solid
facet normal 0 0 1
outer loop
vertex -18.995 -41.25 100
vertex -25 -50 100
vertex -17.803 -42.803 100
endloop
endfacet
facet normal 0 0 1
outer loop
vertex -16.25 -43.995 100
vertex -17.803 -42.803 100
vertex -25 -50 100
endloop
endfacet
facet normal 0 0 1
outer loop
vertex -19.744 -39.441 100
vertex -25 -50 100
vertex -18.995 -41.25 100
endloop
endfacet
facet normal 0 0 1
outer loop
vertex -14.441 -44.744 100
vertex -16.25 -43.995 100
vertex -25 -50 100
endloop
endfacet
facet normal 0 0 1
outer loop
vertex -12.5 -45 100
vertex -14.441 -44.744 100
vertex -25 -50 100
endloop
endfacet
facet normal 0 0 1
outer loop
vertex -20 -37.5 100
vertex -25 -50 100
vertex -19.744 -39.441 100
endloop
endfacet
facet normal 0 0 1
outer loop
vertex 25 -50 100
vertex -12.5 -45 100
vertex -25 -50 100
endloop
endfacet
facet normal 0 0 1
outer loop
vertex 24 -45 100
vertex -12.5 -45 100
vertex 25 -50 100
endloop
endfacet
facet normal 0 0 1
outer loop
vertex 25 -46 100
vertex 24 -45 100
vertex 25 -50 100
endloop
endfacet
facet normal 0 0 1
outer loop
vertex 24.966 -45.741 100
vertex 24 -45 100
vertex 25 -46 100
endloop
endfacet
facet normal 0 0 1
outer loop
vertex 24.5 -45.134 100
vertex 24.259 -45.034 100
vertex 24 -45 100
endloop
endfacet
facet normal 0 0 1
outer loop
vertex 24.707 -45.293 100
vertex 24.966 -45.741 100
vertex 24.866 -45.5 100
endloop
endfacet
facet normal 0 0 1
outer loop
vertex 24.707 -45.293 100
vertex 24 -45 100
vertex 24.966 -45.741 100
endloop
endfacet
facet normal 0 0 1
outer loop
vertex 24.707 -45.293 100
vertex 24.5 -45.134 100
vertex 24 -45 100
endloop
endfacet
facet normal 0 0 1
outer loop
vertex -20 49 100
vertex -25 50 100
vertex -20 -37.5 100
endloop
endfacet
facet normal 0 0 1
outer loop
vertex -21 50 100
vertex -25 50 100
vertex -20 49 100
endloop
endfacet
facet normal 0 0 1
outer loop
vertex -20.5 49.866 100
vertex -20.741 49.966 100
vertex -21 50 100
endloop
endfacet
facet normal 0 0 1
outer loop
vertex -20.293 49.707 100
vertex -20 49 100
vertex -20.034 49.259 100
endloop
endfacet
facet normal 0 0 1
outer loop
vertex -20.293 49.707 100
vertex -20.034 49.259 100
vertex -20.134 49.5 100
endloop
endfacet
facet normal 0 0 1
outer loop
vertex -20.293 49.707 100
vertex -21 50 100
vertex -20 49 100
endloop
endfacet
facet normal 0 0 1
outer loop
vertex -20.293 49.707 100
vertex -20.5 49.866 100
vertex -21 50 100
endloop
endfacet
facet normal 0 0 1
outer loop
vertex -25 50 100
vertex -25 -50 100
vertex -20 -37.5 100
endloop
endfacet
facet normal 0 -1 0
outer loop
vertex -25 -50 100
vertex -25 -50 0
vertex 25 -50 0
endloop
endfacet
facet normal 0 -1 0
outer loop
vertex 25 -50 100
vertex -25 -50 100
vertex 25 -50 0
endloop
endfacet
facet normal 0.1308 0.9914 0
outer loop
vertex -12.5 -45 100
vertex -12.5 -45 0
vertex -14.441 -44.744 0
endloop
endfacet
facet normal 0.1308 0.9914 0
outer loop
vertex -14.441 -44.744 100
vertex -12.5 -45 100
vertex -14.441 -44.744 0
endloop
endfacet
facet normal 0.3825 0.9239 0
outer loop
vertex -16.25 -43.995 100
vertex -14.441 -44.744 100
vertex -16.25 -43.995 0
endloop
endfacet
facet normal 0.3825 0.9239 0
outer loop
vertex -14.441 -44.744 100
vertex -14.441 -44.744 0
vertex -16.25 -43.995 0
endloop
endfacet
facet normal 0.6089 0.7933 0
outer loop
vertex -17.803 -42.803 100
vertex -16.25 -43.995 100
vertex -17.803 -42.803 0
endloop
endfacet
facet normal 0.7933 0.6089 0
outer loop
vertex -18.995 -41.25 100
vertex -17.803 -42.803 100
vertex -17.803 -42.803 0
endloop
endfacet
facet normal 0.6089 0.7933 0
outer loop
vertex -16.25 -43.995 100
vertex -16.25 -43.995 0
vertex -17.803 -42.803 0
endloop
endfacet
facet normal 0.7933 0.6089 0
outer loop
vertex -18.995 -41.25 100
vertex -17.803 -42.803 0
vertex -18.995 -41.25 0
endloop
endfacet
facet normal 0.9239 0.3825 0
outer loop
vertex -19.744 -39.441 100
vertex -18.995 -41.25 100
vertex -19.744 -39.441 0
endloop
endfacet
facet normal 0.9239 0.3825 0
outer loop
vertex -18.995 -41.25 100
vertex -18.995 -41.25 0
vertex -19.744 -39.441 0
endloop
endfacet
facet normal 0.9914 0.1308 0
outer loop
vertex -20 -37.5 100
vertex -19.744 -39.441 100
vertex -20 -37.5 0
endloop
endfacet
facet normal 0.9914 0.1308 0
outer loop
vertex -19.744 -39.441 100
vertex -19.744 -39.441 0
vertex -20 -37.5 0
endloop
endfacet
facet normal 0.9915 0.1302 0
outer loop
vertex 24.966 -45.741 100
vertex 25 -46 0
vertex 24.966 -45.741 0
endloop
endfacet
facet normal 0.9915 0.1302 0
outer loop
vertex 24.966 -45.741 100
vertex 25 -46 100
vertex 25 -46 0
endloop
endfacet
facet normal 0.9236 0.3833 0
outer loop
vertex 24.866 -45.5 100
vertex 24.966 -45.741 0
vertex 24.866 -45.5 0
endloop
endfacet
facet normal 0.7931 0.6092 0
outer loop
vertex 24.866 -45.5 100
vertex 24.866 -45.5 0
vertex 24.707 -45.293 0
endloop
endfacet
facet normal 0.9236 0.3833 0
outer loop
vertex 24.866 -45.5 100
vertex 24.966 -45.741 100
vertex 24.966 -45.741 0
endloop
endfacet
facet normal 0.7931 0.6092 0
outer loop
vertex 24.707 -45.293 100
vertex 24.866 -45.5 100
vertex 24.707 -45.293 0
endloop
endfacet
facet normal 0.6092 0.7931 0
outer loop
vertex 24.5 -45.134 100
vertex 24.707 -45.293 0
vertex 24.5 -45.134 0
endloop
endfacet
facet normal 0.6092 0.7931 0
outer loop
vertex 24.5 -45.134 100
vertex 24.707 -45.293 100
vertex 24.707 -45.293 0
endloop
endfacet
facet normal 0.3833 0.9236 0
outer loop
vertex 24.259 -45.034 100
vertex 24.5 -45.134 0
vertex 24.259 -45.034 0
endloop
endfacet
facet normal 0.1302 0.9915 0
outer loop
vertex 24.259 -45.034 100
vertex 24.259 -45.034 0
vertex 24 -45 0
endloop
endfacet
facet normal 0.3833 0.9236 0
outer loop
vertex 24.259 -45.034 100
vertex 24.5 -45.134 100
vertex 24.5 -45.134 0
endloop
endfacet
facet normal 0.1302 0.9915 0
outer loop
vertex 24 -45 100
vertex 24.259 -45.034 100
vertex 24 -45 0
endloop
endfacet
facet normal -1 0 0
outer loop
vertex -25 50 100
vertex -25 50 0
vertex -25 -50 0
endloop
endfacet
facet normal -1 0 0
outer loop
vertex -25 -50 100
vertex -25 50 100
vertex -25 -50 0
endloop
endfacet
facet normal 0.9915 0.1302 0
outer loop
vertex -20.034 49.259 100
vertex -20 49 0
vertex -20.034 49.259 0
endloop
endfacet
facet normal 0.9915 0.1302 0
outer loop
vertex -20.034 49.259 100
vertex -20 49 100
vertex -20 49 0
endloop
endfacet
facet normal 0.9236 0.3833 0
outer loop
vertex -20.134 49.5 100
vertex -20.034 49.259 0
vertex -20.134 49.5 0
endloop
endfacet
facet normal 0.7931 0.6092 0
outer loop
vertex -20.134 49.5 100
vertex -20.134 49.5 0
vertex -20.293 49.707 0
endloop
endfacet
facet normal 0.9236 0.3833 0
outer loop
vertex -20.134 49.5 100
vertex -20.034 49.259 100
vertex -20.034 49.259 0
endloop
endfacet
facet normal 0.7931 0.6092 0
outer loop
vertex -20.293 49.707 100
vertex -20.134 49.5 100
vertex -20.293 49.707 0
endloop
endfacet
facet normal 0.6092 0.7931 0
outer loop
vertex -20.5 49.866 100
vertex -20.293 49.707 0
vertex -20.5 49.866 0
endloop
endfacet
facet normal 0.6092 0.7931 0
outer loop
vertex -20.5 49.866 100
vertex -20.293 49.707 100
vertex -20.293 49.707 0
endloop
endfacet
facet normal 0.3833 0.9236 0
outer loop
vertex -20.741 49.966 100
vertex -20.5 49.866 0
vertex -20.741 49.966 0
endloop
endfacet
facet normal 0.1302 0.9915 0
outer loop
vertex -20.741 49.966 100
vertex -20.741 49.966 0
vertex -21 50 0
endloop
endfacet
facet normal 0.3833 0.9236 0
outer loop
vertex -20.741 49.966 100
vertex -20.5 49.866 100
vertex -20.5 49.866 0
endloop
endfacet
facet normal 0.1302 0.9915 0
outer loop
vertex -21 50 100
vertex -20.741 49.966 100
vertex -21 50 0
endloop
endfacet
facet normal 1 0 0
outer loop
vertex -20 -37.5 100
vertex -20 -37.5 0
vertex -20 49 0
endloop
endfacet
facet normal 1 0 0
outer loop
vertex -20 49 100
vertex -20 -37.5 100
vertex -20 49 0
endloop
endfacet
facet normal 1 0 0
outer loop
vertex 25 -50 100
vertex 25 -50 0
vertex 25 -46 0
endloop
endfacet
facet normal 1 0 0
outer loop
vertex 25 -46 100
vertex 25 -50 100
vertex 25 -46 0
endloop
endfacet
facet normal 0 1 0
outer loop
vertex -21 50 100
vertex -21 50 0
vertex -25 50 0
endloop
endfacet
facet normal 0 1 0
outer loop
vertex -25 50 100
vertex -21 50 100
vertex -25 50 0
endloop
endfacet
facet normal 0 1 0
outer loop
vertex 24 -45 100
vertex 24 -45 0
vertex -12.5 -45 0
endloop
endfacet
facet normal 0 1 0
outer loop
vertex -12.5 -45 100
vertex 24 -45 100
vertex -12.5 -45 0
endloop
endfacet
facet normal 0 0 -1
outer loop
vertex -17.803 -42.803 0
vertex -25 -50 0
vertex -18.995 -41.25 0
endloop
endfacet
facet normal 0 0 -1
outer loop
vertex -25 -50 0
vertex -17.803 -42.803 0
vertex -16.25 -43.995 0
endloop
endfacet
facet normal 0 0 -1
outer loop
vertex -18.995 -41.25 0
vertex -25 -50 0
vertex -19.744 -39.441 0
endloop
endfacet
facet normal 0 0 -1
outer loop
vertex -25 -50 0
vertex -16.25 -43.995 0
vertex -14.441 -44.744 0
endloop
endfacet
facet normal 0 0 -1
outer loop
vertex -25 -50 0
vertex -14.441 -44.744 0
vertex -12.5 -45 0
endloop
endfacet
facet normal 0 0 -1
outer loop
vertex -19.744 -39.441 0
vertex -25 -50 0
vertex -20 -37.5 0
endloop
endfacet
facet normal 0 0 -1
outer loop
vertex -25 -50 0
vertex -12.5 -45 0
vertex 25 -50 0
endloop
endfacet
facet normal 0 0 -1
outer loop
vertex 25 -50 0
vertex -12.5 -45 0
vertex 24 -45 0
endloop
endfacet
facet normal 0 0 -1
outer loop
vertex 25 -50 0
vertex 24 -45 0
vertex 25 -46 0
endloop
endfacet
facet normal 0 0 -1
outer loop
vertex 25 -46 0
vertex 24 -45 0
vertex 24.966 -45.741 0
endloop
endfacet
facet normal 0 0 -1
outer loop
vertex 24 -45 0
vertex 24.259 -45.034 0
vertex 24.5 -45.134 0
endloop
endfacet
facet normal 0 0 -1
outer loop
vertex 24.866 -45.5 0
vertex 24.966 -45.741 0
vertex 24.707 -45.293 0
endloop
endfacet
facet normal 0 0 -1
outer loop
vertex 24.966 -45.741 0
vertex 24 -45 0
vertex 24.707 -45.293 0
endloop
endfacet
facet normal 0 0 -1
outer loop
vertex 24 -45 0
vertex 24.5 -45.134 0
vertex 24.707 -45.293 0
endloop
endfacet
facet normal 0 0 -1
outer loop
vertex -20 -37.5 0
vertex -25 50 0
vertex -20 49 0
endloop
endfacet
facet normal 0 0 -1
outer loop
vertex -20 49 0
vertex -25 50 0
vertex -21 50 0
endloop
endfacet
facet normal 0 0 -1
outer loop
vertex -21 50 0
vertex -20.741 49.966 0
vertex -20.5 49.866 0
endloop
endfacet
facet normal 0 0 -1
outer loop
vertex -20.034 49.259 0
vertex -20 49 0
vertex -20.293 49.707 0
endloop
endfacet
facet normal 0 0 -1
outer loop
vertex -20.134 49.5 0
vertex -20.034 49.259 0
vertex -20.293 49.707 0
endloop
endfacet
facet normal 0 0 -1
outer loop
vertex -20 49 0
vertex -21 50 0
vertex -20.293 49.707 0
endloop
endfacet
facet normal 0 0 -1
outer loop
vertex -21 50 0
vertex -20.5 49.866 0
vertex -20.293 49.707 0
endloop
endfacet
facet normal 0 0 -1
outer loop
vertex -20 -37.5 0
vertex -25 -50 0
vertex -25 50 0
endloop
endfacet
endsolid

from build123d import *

# Parameters (mm, degrees)
F1_DEPTH = 100
F2_R     = 1


# Not quite as in the source:
# - a feature names something its author has since deleted; it is built from what else it names


with BuildPart() as f1:
    # F0 (on Top) → F1 (new body)
    with BuildSketch(Plane.XY):
        with BuildLine():
            Line((-25, 50), (-25, -50))
            Line((-25, -50), (25, -50))
            Line((25, -50), (25, -45))
            Line((25, -45), (-12.5, -45))
            ThreePointArc((-12.5, -45), (-17.8033008589, -42.8033008589), (-20, -37.5))
            Line((-20, -37.5), (-20, 50))
            Line((-20, 50), (-25, 50))
        make_face()
    extrude(amount=F1_DEPTH)

    # F2
    f2_edges = [f1.edges().sort_by_distance(p)[0] for p in [
        (-20, 50, 50),
        (25, -45, 50),
    ]]
    fillet(f2_edges, radius=F2_R)


solid = f1.part
